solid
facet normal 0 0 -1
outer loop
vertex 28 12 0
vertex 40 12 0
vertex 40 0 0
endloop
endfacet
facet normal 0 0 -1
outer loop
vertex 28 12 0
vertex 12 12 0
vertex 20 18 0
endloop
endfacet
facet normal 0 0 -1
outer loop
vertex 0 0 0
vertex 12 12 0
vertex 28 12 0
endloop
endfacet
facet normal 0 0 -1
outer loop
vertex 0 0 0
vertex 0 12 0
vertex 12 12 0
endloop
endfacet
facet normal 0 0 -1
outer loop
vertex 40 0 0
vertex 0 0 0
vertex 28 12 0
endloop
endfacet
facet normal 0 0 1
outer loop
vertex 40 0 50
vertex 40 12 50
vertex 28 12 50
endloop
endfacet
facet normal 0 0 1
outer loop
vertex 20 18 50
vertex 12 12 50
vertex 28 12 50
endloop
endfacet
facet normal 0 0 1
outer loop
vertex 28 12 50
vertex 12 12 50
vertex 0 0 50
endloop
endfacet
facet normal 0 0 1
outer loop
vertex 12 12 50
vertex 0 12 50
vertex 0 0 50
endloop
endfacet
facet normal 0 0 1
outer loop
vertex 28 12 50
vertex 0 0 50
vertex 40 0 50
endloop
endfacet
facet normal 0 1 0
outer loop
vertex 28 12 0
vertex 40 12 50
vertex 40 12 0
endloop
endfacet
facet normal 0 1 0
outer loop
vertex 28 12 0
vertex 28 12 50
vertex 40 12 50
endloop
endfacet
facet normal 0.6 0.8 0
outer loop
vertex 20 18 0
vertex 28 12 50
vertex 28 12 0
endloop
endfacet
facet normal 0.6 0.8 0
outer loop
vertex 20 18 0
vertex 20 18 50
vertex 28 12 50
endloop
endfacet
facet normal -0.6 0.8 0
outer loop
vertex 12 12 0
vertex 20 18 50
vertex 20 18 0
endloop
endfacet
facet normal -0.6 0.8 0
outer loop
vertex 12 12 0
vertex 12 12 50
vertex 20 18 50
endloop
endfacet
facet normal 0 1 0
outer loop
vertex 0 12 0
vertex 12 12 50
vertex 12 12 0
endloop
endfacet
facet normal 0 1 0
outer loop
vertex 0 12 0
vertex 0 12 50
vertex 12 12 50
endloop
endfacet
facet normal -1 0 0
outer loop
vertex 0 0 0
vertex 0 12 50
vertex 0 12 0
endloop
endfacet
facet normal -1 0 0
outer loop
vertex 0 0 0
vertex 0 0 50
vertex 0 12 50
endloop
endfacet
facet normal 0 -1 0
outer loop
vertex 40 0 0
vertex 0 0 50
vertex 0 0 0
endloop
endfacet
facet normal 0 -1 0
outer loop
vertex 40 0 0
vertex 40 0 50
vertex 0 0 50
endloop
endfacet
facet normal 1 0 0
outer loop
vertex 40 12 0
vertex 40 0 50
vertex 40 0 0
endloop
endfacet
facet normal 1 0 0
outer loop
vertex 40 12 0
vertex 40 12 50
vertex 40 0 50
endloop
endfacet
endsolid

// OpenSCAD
$fn = 32;

// ----------------------------------------------------------------------
// V guide rail: vrib, 40 mm wide
// ----------------------------------------------------------------------

// --- parameters (mm) ---
rail_w = 40;              // rail width, X
base_t = 12;              // base plate thickness
v_depth = 6;              // V feature depth / height
v_half_w = 8;             // half width of the V at the base face
plate_t = 50;             // rail length, Z (the extrusion height)

profile = [[0, 0], [40, 0], [40, 12], [28, 12], [20, 18], [12, 12], [0, 12]];  // primary outline, 7 points, counter clockwise

// --- the one profile operation ---
linear_extrude(height = plate_t) polygon(points = profile);
